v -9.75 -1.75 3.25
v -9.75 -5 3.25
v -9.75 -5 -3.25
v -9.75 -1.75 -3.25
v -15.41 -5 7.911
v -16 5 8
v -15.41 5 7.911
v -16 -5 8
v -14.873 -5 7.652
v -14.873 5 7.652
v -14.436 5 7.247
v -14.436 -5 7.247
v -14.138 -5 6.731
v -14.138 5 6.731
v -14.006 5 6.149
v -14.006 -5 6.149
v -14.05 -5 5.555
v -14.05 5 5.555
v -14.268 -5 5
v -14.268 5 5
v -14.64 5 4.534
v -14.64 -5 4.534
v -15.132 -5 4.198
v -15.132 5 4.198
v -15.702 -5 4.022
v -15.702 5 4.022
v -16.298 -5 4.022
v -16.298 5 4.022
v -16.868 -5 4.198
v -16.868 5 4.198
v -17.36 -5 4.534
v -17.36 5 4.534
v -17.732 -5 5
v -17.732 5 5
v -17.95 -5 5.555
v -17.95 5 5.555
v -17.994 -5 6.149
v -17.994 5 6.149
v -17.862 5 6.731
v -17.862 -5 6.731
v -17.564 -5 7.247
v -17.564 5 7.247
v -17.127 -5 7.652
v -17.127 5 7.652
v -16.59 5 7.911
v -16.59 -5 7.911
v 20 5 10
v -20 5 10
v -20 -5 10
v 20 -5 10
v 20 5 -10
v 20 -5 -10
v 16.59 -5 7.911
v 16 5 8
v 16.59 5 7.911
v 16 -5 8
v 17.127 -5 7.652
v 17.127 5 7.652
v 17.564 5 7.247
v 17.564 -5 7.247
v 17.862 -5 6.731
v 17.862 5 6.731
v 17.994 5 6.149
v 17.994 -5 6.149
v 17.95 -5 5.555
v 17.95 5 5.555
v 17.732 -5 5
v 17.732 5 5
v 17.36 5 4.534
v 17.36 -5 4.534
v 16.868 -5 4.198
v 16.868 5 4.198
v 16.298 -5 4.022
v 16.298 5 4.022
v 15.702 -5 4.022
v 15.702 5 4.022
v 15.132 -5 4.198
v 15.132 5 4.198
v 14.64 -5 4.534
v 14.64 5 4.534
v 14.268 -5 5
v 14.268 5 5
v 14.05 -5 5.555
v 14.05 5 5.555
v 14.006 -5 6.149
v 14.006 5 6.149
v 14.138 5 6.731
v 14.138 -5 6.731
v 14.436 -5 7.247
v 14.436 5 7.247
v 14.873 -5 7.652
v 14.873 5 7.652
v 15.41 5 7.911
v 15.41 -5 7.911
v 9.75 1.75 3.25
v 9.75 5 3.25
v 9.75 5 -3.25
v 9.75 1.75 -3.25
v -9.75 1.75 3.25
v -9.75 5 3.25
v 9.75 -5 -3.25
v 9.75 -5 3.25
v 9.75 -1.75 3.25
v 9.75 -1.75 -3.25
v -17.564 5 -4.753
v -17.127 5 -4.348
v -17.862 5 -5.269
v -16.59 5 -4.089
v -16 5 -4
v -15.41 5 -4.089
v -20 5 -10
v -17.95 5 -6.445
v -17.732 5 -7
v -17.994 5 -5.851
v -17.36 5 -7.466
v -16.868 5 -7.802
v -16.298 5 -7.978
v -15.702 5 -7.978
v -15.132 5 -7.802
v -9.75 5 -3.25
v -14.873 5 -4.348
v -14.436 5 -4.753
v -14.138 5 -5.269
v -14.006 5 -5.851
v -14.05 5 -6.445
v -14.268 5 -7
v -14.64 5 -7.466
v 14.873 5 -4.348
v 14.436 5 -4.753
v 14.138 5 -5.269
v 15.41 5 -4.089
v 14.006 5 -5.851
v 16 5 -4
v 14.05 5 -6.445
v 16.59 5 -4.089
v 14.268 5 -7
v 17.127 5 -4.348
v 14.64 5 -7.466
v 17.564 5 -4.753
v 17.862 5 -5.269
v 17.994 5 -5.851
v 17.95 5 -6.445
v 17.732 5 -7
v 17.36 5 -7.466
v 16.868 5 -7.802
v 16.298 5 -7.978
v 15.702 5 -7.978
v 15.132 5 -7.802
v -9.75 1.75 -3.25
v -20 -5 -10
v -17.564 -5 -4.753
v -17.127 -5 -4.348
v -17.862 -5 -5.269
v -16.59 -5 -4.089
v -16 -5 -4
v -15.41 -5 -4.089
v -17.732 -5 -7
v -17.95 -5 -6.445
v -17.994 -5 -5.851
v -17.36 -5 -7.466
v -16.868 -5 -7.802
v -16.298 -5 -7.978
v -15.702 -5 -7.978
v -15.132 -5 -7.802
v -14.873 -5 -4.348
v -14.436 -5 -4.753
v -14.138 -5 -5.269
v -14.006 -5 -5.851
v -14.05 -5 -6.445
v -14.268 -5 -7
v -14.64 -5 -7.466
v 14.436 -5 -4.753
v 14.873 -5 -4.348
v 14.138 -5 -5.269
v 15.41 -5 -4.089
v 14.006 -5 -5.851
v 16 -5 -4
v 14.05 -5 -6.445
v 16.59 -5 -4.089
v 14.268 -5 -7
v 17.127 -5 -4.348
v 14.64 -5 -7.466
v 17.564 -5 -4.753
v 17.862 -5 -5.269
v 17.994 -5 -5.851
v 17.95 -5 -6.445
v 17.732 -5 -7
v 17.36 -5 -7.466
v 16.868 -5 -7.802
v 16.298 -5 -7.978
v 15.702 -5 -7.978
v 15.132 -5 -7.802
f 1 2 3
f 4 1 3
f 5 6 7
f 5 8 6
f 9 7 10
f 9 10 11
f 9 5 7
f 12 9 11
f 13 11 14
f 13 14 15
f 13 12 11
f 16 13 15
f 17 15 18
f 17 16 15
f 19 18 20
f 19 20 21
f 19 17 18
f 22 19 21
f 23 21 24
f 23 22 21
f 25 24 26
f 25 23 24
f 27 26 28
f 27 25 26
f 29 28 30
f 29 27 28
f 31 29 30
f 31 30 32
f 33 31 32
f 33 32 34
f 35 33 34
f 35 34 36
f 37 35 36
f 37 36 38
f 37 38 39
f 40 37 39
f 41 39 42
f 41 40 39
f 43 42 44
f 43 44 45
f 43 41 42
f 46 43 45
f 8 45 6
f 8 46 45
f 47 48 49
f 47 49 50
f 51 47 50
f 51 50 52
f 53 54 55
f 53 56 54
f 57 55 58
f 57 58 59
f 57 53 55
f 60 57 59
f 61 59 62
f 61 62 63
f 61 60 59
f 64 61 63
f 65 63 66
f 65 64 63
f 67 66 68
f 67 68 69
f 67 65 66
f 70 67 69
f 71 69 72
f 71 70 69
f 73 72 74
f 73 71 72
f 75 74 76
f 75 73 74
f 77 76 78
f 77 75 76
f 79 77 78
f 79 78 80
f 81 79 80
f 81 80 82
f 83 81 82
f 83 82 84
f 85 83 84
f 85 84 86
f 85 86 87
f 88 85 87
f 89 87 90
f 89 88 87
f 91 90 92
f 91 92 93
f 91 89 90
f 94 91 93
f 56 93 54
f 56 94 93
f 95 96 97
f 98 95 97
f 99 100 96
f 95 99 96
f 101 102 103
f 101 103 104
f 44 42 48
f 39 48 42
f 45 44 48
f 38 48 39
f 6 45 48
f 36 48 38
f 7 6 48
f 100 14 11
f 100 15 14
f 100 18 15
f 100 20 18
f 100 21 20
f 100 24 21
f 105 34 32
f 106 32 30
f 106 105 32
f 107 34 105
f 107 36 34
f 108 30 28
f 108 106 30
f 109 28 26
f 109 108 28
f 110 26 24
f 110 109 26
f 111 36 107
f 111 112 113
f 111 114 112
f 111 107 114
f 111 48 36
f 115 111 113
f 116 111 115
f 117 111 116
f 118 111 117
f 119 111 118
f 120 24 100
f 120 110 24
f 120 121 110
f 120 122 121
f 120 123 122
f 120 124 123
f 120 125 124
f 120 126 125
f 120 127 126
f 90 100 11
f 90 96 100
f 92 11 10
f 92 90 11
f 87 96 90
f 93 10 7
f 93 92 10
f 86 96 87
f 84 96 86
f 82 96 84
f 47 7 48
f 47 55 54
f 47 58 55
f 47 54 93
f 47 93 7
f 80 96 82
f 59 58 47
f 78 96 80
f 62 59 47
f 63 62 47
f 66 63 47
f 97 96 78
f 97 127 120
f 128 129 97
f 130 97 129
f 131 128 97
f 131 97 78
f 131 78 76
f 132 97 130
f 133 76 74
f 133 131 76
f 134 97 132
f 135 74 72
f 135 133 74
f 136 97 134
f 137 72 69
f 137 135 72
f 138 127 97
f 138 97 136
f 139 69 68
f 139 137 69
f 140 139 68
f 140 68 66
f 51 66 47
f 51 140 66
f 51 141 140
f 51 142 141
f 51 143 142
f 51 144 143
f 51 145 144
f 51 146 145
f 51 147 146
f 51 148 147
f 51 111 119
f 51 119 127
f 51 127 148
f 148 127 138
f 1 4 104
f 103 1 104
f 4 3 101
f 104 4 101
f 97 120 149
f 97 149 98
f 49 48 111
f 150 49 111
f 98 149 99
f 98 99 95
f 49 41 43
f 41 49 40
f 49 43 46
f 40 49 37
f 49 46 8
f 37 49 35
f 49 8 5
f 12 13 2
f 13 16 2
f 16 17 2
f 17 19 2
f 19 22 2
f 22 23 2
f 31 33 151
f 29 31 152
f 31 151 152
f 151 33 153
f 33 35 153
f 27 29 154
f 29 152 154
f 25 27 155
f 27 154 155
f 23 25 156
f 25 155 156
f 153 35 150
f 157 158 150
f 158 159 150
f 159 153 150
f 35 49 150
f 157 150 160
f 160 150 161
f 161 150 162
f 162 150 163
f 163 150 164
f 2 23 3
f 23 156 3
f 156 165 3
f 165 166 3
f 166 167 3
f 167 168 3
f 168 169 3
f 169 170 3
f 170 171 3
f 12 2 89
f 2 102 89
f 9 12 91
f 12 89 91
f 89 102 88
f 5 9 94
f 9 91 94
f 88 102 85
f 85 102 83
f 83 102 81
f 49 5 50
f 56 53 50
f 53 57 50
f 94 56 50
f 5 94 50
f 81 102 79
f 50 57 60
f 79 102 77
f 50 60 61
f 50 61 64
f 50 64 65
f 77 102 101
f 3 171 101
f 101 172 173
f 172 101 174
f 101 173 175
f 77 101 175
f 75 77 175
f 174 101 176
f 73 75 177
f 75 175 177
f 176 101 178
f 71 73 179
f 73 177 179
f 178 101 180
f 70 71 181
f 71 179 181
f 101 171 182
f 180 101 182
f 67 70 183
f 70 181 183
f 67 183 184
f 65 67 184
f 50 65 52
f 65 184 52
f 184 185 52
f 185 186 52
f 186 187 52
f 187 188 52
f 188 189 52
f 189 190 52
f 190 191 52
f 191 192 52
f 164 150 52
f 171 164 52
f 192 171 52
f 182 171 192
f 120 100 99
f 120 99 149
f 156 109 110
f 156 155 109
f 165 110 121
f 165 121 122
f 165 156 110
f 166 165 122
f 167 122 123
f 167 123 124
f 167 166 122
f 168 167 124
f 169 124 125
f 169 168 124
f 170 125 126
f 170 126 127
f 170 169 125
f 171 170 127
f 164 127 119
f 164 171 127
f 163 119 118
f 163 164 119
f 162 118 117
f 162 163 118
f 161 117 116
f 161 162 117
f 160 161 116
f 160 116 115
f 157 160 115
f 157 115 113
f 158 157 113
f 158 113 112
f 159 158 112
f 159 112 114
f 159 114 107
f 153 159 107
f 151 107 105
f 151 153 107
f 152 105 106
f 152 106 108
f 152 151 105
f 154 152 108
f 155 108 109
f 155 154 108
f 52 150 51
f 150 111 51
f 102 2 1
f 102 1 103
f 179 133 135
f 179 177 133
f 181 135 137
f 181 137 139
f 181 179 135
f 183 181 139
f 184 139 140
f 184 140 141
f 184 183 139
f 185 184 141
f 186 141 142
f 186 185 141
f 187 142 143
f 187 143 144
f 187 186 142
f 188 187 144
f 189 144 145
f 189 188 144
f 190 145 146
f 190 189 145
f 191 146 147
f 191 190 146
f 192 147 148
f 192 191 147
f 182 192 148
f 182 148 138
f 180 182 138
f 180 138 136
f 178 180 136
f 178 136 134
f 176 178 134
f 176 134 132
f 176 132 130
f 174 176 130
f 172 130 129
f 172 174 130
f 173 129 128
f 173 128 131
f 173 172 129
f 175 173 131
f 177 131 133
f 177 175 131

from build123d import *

# Parameters (mm, degrees)
SKETCH1_W           = 40
SKETCH1_H           = 20
SKETCH1_R           = 2
BOSS_EXTRUDE1_DEPTH = 5
SKETCH2_W           = 19.5
SKETCH2_H           = 6.5
CUT_EXTRUDE1_DEPTH  = 3.25


with BuildPart() as part:
    # Sketch1 → Boss-Extrude1 (new, symmetric)
    with BuildSketch(Plane(origin=(0, 0, 0), x_dir=(1, 0, 0), z_dir=(0, 1, 0))):
        Rectangle(SKETCH1_W, SKETCH1_H)
        with Locations(Location((-16, 6, 0), (0, 0, 270))):
            Circle(SKETCH1_R, mode=Mode.SUBTRACT)
        with Locations(Location((16, 6, 0), (0, 0, 270))):
            Circle(SKETCH1_R, mode=Mode.SUBTRACT)
        with Locations(Location((16, -6, 0), (0, 0, 270))):
            Circle(SKETCH1_R, mode=Mode.SUBTRACT)
        with Locations(Location((-16, -6, 0), (0, 0, 270))):
            Circle(SKETCH1_R, mode=Mode.SUBTRACT)
    extrude(amount=BOSS_EXTRUDE1_DEPTH, both=True)

    # Sketch2 → Cut-Extrude1 (cut, symmetric)
    with BuildSketch(Plane(origin=(0, 5, 0), x_dir=(1, 0, 0), z_dir=(0, 1, 0))):
        Rectangle(SKETCH2_W, SKETCH2_H)
    cut_extrude1 = extrude(amount=CUT_EXTRUDE1_DEPTH, both=True, mode=Mode.SUBTRACT)

    # Mirror1: Cut-Extrude1 across plane
    add(cut_extrude1.mirror(Plane.ZX), mode=Mode.SUBTRACT)


solid = part.part
